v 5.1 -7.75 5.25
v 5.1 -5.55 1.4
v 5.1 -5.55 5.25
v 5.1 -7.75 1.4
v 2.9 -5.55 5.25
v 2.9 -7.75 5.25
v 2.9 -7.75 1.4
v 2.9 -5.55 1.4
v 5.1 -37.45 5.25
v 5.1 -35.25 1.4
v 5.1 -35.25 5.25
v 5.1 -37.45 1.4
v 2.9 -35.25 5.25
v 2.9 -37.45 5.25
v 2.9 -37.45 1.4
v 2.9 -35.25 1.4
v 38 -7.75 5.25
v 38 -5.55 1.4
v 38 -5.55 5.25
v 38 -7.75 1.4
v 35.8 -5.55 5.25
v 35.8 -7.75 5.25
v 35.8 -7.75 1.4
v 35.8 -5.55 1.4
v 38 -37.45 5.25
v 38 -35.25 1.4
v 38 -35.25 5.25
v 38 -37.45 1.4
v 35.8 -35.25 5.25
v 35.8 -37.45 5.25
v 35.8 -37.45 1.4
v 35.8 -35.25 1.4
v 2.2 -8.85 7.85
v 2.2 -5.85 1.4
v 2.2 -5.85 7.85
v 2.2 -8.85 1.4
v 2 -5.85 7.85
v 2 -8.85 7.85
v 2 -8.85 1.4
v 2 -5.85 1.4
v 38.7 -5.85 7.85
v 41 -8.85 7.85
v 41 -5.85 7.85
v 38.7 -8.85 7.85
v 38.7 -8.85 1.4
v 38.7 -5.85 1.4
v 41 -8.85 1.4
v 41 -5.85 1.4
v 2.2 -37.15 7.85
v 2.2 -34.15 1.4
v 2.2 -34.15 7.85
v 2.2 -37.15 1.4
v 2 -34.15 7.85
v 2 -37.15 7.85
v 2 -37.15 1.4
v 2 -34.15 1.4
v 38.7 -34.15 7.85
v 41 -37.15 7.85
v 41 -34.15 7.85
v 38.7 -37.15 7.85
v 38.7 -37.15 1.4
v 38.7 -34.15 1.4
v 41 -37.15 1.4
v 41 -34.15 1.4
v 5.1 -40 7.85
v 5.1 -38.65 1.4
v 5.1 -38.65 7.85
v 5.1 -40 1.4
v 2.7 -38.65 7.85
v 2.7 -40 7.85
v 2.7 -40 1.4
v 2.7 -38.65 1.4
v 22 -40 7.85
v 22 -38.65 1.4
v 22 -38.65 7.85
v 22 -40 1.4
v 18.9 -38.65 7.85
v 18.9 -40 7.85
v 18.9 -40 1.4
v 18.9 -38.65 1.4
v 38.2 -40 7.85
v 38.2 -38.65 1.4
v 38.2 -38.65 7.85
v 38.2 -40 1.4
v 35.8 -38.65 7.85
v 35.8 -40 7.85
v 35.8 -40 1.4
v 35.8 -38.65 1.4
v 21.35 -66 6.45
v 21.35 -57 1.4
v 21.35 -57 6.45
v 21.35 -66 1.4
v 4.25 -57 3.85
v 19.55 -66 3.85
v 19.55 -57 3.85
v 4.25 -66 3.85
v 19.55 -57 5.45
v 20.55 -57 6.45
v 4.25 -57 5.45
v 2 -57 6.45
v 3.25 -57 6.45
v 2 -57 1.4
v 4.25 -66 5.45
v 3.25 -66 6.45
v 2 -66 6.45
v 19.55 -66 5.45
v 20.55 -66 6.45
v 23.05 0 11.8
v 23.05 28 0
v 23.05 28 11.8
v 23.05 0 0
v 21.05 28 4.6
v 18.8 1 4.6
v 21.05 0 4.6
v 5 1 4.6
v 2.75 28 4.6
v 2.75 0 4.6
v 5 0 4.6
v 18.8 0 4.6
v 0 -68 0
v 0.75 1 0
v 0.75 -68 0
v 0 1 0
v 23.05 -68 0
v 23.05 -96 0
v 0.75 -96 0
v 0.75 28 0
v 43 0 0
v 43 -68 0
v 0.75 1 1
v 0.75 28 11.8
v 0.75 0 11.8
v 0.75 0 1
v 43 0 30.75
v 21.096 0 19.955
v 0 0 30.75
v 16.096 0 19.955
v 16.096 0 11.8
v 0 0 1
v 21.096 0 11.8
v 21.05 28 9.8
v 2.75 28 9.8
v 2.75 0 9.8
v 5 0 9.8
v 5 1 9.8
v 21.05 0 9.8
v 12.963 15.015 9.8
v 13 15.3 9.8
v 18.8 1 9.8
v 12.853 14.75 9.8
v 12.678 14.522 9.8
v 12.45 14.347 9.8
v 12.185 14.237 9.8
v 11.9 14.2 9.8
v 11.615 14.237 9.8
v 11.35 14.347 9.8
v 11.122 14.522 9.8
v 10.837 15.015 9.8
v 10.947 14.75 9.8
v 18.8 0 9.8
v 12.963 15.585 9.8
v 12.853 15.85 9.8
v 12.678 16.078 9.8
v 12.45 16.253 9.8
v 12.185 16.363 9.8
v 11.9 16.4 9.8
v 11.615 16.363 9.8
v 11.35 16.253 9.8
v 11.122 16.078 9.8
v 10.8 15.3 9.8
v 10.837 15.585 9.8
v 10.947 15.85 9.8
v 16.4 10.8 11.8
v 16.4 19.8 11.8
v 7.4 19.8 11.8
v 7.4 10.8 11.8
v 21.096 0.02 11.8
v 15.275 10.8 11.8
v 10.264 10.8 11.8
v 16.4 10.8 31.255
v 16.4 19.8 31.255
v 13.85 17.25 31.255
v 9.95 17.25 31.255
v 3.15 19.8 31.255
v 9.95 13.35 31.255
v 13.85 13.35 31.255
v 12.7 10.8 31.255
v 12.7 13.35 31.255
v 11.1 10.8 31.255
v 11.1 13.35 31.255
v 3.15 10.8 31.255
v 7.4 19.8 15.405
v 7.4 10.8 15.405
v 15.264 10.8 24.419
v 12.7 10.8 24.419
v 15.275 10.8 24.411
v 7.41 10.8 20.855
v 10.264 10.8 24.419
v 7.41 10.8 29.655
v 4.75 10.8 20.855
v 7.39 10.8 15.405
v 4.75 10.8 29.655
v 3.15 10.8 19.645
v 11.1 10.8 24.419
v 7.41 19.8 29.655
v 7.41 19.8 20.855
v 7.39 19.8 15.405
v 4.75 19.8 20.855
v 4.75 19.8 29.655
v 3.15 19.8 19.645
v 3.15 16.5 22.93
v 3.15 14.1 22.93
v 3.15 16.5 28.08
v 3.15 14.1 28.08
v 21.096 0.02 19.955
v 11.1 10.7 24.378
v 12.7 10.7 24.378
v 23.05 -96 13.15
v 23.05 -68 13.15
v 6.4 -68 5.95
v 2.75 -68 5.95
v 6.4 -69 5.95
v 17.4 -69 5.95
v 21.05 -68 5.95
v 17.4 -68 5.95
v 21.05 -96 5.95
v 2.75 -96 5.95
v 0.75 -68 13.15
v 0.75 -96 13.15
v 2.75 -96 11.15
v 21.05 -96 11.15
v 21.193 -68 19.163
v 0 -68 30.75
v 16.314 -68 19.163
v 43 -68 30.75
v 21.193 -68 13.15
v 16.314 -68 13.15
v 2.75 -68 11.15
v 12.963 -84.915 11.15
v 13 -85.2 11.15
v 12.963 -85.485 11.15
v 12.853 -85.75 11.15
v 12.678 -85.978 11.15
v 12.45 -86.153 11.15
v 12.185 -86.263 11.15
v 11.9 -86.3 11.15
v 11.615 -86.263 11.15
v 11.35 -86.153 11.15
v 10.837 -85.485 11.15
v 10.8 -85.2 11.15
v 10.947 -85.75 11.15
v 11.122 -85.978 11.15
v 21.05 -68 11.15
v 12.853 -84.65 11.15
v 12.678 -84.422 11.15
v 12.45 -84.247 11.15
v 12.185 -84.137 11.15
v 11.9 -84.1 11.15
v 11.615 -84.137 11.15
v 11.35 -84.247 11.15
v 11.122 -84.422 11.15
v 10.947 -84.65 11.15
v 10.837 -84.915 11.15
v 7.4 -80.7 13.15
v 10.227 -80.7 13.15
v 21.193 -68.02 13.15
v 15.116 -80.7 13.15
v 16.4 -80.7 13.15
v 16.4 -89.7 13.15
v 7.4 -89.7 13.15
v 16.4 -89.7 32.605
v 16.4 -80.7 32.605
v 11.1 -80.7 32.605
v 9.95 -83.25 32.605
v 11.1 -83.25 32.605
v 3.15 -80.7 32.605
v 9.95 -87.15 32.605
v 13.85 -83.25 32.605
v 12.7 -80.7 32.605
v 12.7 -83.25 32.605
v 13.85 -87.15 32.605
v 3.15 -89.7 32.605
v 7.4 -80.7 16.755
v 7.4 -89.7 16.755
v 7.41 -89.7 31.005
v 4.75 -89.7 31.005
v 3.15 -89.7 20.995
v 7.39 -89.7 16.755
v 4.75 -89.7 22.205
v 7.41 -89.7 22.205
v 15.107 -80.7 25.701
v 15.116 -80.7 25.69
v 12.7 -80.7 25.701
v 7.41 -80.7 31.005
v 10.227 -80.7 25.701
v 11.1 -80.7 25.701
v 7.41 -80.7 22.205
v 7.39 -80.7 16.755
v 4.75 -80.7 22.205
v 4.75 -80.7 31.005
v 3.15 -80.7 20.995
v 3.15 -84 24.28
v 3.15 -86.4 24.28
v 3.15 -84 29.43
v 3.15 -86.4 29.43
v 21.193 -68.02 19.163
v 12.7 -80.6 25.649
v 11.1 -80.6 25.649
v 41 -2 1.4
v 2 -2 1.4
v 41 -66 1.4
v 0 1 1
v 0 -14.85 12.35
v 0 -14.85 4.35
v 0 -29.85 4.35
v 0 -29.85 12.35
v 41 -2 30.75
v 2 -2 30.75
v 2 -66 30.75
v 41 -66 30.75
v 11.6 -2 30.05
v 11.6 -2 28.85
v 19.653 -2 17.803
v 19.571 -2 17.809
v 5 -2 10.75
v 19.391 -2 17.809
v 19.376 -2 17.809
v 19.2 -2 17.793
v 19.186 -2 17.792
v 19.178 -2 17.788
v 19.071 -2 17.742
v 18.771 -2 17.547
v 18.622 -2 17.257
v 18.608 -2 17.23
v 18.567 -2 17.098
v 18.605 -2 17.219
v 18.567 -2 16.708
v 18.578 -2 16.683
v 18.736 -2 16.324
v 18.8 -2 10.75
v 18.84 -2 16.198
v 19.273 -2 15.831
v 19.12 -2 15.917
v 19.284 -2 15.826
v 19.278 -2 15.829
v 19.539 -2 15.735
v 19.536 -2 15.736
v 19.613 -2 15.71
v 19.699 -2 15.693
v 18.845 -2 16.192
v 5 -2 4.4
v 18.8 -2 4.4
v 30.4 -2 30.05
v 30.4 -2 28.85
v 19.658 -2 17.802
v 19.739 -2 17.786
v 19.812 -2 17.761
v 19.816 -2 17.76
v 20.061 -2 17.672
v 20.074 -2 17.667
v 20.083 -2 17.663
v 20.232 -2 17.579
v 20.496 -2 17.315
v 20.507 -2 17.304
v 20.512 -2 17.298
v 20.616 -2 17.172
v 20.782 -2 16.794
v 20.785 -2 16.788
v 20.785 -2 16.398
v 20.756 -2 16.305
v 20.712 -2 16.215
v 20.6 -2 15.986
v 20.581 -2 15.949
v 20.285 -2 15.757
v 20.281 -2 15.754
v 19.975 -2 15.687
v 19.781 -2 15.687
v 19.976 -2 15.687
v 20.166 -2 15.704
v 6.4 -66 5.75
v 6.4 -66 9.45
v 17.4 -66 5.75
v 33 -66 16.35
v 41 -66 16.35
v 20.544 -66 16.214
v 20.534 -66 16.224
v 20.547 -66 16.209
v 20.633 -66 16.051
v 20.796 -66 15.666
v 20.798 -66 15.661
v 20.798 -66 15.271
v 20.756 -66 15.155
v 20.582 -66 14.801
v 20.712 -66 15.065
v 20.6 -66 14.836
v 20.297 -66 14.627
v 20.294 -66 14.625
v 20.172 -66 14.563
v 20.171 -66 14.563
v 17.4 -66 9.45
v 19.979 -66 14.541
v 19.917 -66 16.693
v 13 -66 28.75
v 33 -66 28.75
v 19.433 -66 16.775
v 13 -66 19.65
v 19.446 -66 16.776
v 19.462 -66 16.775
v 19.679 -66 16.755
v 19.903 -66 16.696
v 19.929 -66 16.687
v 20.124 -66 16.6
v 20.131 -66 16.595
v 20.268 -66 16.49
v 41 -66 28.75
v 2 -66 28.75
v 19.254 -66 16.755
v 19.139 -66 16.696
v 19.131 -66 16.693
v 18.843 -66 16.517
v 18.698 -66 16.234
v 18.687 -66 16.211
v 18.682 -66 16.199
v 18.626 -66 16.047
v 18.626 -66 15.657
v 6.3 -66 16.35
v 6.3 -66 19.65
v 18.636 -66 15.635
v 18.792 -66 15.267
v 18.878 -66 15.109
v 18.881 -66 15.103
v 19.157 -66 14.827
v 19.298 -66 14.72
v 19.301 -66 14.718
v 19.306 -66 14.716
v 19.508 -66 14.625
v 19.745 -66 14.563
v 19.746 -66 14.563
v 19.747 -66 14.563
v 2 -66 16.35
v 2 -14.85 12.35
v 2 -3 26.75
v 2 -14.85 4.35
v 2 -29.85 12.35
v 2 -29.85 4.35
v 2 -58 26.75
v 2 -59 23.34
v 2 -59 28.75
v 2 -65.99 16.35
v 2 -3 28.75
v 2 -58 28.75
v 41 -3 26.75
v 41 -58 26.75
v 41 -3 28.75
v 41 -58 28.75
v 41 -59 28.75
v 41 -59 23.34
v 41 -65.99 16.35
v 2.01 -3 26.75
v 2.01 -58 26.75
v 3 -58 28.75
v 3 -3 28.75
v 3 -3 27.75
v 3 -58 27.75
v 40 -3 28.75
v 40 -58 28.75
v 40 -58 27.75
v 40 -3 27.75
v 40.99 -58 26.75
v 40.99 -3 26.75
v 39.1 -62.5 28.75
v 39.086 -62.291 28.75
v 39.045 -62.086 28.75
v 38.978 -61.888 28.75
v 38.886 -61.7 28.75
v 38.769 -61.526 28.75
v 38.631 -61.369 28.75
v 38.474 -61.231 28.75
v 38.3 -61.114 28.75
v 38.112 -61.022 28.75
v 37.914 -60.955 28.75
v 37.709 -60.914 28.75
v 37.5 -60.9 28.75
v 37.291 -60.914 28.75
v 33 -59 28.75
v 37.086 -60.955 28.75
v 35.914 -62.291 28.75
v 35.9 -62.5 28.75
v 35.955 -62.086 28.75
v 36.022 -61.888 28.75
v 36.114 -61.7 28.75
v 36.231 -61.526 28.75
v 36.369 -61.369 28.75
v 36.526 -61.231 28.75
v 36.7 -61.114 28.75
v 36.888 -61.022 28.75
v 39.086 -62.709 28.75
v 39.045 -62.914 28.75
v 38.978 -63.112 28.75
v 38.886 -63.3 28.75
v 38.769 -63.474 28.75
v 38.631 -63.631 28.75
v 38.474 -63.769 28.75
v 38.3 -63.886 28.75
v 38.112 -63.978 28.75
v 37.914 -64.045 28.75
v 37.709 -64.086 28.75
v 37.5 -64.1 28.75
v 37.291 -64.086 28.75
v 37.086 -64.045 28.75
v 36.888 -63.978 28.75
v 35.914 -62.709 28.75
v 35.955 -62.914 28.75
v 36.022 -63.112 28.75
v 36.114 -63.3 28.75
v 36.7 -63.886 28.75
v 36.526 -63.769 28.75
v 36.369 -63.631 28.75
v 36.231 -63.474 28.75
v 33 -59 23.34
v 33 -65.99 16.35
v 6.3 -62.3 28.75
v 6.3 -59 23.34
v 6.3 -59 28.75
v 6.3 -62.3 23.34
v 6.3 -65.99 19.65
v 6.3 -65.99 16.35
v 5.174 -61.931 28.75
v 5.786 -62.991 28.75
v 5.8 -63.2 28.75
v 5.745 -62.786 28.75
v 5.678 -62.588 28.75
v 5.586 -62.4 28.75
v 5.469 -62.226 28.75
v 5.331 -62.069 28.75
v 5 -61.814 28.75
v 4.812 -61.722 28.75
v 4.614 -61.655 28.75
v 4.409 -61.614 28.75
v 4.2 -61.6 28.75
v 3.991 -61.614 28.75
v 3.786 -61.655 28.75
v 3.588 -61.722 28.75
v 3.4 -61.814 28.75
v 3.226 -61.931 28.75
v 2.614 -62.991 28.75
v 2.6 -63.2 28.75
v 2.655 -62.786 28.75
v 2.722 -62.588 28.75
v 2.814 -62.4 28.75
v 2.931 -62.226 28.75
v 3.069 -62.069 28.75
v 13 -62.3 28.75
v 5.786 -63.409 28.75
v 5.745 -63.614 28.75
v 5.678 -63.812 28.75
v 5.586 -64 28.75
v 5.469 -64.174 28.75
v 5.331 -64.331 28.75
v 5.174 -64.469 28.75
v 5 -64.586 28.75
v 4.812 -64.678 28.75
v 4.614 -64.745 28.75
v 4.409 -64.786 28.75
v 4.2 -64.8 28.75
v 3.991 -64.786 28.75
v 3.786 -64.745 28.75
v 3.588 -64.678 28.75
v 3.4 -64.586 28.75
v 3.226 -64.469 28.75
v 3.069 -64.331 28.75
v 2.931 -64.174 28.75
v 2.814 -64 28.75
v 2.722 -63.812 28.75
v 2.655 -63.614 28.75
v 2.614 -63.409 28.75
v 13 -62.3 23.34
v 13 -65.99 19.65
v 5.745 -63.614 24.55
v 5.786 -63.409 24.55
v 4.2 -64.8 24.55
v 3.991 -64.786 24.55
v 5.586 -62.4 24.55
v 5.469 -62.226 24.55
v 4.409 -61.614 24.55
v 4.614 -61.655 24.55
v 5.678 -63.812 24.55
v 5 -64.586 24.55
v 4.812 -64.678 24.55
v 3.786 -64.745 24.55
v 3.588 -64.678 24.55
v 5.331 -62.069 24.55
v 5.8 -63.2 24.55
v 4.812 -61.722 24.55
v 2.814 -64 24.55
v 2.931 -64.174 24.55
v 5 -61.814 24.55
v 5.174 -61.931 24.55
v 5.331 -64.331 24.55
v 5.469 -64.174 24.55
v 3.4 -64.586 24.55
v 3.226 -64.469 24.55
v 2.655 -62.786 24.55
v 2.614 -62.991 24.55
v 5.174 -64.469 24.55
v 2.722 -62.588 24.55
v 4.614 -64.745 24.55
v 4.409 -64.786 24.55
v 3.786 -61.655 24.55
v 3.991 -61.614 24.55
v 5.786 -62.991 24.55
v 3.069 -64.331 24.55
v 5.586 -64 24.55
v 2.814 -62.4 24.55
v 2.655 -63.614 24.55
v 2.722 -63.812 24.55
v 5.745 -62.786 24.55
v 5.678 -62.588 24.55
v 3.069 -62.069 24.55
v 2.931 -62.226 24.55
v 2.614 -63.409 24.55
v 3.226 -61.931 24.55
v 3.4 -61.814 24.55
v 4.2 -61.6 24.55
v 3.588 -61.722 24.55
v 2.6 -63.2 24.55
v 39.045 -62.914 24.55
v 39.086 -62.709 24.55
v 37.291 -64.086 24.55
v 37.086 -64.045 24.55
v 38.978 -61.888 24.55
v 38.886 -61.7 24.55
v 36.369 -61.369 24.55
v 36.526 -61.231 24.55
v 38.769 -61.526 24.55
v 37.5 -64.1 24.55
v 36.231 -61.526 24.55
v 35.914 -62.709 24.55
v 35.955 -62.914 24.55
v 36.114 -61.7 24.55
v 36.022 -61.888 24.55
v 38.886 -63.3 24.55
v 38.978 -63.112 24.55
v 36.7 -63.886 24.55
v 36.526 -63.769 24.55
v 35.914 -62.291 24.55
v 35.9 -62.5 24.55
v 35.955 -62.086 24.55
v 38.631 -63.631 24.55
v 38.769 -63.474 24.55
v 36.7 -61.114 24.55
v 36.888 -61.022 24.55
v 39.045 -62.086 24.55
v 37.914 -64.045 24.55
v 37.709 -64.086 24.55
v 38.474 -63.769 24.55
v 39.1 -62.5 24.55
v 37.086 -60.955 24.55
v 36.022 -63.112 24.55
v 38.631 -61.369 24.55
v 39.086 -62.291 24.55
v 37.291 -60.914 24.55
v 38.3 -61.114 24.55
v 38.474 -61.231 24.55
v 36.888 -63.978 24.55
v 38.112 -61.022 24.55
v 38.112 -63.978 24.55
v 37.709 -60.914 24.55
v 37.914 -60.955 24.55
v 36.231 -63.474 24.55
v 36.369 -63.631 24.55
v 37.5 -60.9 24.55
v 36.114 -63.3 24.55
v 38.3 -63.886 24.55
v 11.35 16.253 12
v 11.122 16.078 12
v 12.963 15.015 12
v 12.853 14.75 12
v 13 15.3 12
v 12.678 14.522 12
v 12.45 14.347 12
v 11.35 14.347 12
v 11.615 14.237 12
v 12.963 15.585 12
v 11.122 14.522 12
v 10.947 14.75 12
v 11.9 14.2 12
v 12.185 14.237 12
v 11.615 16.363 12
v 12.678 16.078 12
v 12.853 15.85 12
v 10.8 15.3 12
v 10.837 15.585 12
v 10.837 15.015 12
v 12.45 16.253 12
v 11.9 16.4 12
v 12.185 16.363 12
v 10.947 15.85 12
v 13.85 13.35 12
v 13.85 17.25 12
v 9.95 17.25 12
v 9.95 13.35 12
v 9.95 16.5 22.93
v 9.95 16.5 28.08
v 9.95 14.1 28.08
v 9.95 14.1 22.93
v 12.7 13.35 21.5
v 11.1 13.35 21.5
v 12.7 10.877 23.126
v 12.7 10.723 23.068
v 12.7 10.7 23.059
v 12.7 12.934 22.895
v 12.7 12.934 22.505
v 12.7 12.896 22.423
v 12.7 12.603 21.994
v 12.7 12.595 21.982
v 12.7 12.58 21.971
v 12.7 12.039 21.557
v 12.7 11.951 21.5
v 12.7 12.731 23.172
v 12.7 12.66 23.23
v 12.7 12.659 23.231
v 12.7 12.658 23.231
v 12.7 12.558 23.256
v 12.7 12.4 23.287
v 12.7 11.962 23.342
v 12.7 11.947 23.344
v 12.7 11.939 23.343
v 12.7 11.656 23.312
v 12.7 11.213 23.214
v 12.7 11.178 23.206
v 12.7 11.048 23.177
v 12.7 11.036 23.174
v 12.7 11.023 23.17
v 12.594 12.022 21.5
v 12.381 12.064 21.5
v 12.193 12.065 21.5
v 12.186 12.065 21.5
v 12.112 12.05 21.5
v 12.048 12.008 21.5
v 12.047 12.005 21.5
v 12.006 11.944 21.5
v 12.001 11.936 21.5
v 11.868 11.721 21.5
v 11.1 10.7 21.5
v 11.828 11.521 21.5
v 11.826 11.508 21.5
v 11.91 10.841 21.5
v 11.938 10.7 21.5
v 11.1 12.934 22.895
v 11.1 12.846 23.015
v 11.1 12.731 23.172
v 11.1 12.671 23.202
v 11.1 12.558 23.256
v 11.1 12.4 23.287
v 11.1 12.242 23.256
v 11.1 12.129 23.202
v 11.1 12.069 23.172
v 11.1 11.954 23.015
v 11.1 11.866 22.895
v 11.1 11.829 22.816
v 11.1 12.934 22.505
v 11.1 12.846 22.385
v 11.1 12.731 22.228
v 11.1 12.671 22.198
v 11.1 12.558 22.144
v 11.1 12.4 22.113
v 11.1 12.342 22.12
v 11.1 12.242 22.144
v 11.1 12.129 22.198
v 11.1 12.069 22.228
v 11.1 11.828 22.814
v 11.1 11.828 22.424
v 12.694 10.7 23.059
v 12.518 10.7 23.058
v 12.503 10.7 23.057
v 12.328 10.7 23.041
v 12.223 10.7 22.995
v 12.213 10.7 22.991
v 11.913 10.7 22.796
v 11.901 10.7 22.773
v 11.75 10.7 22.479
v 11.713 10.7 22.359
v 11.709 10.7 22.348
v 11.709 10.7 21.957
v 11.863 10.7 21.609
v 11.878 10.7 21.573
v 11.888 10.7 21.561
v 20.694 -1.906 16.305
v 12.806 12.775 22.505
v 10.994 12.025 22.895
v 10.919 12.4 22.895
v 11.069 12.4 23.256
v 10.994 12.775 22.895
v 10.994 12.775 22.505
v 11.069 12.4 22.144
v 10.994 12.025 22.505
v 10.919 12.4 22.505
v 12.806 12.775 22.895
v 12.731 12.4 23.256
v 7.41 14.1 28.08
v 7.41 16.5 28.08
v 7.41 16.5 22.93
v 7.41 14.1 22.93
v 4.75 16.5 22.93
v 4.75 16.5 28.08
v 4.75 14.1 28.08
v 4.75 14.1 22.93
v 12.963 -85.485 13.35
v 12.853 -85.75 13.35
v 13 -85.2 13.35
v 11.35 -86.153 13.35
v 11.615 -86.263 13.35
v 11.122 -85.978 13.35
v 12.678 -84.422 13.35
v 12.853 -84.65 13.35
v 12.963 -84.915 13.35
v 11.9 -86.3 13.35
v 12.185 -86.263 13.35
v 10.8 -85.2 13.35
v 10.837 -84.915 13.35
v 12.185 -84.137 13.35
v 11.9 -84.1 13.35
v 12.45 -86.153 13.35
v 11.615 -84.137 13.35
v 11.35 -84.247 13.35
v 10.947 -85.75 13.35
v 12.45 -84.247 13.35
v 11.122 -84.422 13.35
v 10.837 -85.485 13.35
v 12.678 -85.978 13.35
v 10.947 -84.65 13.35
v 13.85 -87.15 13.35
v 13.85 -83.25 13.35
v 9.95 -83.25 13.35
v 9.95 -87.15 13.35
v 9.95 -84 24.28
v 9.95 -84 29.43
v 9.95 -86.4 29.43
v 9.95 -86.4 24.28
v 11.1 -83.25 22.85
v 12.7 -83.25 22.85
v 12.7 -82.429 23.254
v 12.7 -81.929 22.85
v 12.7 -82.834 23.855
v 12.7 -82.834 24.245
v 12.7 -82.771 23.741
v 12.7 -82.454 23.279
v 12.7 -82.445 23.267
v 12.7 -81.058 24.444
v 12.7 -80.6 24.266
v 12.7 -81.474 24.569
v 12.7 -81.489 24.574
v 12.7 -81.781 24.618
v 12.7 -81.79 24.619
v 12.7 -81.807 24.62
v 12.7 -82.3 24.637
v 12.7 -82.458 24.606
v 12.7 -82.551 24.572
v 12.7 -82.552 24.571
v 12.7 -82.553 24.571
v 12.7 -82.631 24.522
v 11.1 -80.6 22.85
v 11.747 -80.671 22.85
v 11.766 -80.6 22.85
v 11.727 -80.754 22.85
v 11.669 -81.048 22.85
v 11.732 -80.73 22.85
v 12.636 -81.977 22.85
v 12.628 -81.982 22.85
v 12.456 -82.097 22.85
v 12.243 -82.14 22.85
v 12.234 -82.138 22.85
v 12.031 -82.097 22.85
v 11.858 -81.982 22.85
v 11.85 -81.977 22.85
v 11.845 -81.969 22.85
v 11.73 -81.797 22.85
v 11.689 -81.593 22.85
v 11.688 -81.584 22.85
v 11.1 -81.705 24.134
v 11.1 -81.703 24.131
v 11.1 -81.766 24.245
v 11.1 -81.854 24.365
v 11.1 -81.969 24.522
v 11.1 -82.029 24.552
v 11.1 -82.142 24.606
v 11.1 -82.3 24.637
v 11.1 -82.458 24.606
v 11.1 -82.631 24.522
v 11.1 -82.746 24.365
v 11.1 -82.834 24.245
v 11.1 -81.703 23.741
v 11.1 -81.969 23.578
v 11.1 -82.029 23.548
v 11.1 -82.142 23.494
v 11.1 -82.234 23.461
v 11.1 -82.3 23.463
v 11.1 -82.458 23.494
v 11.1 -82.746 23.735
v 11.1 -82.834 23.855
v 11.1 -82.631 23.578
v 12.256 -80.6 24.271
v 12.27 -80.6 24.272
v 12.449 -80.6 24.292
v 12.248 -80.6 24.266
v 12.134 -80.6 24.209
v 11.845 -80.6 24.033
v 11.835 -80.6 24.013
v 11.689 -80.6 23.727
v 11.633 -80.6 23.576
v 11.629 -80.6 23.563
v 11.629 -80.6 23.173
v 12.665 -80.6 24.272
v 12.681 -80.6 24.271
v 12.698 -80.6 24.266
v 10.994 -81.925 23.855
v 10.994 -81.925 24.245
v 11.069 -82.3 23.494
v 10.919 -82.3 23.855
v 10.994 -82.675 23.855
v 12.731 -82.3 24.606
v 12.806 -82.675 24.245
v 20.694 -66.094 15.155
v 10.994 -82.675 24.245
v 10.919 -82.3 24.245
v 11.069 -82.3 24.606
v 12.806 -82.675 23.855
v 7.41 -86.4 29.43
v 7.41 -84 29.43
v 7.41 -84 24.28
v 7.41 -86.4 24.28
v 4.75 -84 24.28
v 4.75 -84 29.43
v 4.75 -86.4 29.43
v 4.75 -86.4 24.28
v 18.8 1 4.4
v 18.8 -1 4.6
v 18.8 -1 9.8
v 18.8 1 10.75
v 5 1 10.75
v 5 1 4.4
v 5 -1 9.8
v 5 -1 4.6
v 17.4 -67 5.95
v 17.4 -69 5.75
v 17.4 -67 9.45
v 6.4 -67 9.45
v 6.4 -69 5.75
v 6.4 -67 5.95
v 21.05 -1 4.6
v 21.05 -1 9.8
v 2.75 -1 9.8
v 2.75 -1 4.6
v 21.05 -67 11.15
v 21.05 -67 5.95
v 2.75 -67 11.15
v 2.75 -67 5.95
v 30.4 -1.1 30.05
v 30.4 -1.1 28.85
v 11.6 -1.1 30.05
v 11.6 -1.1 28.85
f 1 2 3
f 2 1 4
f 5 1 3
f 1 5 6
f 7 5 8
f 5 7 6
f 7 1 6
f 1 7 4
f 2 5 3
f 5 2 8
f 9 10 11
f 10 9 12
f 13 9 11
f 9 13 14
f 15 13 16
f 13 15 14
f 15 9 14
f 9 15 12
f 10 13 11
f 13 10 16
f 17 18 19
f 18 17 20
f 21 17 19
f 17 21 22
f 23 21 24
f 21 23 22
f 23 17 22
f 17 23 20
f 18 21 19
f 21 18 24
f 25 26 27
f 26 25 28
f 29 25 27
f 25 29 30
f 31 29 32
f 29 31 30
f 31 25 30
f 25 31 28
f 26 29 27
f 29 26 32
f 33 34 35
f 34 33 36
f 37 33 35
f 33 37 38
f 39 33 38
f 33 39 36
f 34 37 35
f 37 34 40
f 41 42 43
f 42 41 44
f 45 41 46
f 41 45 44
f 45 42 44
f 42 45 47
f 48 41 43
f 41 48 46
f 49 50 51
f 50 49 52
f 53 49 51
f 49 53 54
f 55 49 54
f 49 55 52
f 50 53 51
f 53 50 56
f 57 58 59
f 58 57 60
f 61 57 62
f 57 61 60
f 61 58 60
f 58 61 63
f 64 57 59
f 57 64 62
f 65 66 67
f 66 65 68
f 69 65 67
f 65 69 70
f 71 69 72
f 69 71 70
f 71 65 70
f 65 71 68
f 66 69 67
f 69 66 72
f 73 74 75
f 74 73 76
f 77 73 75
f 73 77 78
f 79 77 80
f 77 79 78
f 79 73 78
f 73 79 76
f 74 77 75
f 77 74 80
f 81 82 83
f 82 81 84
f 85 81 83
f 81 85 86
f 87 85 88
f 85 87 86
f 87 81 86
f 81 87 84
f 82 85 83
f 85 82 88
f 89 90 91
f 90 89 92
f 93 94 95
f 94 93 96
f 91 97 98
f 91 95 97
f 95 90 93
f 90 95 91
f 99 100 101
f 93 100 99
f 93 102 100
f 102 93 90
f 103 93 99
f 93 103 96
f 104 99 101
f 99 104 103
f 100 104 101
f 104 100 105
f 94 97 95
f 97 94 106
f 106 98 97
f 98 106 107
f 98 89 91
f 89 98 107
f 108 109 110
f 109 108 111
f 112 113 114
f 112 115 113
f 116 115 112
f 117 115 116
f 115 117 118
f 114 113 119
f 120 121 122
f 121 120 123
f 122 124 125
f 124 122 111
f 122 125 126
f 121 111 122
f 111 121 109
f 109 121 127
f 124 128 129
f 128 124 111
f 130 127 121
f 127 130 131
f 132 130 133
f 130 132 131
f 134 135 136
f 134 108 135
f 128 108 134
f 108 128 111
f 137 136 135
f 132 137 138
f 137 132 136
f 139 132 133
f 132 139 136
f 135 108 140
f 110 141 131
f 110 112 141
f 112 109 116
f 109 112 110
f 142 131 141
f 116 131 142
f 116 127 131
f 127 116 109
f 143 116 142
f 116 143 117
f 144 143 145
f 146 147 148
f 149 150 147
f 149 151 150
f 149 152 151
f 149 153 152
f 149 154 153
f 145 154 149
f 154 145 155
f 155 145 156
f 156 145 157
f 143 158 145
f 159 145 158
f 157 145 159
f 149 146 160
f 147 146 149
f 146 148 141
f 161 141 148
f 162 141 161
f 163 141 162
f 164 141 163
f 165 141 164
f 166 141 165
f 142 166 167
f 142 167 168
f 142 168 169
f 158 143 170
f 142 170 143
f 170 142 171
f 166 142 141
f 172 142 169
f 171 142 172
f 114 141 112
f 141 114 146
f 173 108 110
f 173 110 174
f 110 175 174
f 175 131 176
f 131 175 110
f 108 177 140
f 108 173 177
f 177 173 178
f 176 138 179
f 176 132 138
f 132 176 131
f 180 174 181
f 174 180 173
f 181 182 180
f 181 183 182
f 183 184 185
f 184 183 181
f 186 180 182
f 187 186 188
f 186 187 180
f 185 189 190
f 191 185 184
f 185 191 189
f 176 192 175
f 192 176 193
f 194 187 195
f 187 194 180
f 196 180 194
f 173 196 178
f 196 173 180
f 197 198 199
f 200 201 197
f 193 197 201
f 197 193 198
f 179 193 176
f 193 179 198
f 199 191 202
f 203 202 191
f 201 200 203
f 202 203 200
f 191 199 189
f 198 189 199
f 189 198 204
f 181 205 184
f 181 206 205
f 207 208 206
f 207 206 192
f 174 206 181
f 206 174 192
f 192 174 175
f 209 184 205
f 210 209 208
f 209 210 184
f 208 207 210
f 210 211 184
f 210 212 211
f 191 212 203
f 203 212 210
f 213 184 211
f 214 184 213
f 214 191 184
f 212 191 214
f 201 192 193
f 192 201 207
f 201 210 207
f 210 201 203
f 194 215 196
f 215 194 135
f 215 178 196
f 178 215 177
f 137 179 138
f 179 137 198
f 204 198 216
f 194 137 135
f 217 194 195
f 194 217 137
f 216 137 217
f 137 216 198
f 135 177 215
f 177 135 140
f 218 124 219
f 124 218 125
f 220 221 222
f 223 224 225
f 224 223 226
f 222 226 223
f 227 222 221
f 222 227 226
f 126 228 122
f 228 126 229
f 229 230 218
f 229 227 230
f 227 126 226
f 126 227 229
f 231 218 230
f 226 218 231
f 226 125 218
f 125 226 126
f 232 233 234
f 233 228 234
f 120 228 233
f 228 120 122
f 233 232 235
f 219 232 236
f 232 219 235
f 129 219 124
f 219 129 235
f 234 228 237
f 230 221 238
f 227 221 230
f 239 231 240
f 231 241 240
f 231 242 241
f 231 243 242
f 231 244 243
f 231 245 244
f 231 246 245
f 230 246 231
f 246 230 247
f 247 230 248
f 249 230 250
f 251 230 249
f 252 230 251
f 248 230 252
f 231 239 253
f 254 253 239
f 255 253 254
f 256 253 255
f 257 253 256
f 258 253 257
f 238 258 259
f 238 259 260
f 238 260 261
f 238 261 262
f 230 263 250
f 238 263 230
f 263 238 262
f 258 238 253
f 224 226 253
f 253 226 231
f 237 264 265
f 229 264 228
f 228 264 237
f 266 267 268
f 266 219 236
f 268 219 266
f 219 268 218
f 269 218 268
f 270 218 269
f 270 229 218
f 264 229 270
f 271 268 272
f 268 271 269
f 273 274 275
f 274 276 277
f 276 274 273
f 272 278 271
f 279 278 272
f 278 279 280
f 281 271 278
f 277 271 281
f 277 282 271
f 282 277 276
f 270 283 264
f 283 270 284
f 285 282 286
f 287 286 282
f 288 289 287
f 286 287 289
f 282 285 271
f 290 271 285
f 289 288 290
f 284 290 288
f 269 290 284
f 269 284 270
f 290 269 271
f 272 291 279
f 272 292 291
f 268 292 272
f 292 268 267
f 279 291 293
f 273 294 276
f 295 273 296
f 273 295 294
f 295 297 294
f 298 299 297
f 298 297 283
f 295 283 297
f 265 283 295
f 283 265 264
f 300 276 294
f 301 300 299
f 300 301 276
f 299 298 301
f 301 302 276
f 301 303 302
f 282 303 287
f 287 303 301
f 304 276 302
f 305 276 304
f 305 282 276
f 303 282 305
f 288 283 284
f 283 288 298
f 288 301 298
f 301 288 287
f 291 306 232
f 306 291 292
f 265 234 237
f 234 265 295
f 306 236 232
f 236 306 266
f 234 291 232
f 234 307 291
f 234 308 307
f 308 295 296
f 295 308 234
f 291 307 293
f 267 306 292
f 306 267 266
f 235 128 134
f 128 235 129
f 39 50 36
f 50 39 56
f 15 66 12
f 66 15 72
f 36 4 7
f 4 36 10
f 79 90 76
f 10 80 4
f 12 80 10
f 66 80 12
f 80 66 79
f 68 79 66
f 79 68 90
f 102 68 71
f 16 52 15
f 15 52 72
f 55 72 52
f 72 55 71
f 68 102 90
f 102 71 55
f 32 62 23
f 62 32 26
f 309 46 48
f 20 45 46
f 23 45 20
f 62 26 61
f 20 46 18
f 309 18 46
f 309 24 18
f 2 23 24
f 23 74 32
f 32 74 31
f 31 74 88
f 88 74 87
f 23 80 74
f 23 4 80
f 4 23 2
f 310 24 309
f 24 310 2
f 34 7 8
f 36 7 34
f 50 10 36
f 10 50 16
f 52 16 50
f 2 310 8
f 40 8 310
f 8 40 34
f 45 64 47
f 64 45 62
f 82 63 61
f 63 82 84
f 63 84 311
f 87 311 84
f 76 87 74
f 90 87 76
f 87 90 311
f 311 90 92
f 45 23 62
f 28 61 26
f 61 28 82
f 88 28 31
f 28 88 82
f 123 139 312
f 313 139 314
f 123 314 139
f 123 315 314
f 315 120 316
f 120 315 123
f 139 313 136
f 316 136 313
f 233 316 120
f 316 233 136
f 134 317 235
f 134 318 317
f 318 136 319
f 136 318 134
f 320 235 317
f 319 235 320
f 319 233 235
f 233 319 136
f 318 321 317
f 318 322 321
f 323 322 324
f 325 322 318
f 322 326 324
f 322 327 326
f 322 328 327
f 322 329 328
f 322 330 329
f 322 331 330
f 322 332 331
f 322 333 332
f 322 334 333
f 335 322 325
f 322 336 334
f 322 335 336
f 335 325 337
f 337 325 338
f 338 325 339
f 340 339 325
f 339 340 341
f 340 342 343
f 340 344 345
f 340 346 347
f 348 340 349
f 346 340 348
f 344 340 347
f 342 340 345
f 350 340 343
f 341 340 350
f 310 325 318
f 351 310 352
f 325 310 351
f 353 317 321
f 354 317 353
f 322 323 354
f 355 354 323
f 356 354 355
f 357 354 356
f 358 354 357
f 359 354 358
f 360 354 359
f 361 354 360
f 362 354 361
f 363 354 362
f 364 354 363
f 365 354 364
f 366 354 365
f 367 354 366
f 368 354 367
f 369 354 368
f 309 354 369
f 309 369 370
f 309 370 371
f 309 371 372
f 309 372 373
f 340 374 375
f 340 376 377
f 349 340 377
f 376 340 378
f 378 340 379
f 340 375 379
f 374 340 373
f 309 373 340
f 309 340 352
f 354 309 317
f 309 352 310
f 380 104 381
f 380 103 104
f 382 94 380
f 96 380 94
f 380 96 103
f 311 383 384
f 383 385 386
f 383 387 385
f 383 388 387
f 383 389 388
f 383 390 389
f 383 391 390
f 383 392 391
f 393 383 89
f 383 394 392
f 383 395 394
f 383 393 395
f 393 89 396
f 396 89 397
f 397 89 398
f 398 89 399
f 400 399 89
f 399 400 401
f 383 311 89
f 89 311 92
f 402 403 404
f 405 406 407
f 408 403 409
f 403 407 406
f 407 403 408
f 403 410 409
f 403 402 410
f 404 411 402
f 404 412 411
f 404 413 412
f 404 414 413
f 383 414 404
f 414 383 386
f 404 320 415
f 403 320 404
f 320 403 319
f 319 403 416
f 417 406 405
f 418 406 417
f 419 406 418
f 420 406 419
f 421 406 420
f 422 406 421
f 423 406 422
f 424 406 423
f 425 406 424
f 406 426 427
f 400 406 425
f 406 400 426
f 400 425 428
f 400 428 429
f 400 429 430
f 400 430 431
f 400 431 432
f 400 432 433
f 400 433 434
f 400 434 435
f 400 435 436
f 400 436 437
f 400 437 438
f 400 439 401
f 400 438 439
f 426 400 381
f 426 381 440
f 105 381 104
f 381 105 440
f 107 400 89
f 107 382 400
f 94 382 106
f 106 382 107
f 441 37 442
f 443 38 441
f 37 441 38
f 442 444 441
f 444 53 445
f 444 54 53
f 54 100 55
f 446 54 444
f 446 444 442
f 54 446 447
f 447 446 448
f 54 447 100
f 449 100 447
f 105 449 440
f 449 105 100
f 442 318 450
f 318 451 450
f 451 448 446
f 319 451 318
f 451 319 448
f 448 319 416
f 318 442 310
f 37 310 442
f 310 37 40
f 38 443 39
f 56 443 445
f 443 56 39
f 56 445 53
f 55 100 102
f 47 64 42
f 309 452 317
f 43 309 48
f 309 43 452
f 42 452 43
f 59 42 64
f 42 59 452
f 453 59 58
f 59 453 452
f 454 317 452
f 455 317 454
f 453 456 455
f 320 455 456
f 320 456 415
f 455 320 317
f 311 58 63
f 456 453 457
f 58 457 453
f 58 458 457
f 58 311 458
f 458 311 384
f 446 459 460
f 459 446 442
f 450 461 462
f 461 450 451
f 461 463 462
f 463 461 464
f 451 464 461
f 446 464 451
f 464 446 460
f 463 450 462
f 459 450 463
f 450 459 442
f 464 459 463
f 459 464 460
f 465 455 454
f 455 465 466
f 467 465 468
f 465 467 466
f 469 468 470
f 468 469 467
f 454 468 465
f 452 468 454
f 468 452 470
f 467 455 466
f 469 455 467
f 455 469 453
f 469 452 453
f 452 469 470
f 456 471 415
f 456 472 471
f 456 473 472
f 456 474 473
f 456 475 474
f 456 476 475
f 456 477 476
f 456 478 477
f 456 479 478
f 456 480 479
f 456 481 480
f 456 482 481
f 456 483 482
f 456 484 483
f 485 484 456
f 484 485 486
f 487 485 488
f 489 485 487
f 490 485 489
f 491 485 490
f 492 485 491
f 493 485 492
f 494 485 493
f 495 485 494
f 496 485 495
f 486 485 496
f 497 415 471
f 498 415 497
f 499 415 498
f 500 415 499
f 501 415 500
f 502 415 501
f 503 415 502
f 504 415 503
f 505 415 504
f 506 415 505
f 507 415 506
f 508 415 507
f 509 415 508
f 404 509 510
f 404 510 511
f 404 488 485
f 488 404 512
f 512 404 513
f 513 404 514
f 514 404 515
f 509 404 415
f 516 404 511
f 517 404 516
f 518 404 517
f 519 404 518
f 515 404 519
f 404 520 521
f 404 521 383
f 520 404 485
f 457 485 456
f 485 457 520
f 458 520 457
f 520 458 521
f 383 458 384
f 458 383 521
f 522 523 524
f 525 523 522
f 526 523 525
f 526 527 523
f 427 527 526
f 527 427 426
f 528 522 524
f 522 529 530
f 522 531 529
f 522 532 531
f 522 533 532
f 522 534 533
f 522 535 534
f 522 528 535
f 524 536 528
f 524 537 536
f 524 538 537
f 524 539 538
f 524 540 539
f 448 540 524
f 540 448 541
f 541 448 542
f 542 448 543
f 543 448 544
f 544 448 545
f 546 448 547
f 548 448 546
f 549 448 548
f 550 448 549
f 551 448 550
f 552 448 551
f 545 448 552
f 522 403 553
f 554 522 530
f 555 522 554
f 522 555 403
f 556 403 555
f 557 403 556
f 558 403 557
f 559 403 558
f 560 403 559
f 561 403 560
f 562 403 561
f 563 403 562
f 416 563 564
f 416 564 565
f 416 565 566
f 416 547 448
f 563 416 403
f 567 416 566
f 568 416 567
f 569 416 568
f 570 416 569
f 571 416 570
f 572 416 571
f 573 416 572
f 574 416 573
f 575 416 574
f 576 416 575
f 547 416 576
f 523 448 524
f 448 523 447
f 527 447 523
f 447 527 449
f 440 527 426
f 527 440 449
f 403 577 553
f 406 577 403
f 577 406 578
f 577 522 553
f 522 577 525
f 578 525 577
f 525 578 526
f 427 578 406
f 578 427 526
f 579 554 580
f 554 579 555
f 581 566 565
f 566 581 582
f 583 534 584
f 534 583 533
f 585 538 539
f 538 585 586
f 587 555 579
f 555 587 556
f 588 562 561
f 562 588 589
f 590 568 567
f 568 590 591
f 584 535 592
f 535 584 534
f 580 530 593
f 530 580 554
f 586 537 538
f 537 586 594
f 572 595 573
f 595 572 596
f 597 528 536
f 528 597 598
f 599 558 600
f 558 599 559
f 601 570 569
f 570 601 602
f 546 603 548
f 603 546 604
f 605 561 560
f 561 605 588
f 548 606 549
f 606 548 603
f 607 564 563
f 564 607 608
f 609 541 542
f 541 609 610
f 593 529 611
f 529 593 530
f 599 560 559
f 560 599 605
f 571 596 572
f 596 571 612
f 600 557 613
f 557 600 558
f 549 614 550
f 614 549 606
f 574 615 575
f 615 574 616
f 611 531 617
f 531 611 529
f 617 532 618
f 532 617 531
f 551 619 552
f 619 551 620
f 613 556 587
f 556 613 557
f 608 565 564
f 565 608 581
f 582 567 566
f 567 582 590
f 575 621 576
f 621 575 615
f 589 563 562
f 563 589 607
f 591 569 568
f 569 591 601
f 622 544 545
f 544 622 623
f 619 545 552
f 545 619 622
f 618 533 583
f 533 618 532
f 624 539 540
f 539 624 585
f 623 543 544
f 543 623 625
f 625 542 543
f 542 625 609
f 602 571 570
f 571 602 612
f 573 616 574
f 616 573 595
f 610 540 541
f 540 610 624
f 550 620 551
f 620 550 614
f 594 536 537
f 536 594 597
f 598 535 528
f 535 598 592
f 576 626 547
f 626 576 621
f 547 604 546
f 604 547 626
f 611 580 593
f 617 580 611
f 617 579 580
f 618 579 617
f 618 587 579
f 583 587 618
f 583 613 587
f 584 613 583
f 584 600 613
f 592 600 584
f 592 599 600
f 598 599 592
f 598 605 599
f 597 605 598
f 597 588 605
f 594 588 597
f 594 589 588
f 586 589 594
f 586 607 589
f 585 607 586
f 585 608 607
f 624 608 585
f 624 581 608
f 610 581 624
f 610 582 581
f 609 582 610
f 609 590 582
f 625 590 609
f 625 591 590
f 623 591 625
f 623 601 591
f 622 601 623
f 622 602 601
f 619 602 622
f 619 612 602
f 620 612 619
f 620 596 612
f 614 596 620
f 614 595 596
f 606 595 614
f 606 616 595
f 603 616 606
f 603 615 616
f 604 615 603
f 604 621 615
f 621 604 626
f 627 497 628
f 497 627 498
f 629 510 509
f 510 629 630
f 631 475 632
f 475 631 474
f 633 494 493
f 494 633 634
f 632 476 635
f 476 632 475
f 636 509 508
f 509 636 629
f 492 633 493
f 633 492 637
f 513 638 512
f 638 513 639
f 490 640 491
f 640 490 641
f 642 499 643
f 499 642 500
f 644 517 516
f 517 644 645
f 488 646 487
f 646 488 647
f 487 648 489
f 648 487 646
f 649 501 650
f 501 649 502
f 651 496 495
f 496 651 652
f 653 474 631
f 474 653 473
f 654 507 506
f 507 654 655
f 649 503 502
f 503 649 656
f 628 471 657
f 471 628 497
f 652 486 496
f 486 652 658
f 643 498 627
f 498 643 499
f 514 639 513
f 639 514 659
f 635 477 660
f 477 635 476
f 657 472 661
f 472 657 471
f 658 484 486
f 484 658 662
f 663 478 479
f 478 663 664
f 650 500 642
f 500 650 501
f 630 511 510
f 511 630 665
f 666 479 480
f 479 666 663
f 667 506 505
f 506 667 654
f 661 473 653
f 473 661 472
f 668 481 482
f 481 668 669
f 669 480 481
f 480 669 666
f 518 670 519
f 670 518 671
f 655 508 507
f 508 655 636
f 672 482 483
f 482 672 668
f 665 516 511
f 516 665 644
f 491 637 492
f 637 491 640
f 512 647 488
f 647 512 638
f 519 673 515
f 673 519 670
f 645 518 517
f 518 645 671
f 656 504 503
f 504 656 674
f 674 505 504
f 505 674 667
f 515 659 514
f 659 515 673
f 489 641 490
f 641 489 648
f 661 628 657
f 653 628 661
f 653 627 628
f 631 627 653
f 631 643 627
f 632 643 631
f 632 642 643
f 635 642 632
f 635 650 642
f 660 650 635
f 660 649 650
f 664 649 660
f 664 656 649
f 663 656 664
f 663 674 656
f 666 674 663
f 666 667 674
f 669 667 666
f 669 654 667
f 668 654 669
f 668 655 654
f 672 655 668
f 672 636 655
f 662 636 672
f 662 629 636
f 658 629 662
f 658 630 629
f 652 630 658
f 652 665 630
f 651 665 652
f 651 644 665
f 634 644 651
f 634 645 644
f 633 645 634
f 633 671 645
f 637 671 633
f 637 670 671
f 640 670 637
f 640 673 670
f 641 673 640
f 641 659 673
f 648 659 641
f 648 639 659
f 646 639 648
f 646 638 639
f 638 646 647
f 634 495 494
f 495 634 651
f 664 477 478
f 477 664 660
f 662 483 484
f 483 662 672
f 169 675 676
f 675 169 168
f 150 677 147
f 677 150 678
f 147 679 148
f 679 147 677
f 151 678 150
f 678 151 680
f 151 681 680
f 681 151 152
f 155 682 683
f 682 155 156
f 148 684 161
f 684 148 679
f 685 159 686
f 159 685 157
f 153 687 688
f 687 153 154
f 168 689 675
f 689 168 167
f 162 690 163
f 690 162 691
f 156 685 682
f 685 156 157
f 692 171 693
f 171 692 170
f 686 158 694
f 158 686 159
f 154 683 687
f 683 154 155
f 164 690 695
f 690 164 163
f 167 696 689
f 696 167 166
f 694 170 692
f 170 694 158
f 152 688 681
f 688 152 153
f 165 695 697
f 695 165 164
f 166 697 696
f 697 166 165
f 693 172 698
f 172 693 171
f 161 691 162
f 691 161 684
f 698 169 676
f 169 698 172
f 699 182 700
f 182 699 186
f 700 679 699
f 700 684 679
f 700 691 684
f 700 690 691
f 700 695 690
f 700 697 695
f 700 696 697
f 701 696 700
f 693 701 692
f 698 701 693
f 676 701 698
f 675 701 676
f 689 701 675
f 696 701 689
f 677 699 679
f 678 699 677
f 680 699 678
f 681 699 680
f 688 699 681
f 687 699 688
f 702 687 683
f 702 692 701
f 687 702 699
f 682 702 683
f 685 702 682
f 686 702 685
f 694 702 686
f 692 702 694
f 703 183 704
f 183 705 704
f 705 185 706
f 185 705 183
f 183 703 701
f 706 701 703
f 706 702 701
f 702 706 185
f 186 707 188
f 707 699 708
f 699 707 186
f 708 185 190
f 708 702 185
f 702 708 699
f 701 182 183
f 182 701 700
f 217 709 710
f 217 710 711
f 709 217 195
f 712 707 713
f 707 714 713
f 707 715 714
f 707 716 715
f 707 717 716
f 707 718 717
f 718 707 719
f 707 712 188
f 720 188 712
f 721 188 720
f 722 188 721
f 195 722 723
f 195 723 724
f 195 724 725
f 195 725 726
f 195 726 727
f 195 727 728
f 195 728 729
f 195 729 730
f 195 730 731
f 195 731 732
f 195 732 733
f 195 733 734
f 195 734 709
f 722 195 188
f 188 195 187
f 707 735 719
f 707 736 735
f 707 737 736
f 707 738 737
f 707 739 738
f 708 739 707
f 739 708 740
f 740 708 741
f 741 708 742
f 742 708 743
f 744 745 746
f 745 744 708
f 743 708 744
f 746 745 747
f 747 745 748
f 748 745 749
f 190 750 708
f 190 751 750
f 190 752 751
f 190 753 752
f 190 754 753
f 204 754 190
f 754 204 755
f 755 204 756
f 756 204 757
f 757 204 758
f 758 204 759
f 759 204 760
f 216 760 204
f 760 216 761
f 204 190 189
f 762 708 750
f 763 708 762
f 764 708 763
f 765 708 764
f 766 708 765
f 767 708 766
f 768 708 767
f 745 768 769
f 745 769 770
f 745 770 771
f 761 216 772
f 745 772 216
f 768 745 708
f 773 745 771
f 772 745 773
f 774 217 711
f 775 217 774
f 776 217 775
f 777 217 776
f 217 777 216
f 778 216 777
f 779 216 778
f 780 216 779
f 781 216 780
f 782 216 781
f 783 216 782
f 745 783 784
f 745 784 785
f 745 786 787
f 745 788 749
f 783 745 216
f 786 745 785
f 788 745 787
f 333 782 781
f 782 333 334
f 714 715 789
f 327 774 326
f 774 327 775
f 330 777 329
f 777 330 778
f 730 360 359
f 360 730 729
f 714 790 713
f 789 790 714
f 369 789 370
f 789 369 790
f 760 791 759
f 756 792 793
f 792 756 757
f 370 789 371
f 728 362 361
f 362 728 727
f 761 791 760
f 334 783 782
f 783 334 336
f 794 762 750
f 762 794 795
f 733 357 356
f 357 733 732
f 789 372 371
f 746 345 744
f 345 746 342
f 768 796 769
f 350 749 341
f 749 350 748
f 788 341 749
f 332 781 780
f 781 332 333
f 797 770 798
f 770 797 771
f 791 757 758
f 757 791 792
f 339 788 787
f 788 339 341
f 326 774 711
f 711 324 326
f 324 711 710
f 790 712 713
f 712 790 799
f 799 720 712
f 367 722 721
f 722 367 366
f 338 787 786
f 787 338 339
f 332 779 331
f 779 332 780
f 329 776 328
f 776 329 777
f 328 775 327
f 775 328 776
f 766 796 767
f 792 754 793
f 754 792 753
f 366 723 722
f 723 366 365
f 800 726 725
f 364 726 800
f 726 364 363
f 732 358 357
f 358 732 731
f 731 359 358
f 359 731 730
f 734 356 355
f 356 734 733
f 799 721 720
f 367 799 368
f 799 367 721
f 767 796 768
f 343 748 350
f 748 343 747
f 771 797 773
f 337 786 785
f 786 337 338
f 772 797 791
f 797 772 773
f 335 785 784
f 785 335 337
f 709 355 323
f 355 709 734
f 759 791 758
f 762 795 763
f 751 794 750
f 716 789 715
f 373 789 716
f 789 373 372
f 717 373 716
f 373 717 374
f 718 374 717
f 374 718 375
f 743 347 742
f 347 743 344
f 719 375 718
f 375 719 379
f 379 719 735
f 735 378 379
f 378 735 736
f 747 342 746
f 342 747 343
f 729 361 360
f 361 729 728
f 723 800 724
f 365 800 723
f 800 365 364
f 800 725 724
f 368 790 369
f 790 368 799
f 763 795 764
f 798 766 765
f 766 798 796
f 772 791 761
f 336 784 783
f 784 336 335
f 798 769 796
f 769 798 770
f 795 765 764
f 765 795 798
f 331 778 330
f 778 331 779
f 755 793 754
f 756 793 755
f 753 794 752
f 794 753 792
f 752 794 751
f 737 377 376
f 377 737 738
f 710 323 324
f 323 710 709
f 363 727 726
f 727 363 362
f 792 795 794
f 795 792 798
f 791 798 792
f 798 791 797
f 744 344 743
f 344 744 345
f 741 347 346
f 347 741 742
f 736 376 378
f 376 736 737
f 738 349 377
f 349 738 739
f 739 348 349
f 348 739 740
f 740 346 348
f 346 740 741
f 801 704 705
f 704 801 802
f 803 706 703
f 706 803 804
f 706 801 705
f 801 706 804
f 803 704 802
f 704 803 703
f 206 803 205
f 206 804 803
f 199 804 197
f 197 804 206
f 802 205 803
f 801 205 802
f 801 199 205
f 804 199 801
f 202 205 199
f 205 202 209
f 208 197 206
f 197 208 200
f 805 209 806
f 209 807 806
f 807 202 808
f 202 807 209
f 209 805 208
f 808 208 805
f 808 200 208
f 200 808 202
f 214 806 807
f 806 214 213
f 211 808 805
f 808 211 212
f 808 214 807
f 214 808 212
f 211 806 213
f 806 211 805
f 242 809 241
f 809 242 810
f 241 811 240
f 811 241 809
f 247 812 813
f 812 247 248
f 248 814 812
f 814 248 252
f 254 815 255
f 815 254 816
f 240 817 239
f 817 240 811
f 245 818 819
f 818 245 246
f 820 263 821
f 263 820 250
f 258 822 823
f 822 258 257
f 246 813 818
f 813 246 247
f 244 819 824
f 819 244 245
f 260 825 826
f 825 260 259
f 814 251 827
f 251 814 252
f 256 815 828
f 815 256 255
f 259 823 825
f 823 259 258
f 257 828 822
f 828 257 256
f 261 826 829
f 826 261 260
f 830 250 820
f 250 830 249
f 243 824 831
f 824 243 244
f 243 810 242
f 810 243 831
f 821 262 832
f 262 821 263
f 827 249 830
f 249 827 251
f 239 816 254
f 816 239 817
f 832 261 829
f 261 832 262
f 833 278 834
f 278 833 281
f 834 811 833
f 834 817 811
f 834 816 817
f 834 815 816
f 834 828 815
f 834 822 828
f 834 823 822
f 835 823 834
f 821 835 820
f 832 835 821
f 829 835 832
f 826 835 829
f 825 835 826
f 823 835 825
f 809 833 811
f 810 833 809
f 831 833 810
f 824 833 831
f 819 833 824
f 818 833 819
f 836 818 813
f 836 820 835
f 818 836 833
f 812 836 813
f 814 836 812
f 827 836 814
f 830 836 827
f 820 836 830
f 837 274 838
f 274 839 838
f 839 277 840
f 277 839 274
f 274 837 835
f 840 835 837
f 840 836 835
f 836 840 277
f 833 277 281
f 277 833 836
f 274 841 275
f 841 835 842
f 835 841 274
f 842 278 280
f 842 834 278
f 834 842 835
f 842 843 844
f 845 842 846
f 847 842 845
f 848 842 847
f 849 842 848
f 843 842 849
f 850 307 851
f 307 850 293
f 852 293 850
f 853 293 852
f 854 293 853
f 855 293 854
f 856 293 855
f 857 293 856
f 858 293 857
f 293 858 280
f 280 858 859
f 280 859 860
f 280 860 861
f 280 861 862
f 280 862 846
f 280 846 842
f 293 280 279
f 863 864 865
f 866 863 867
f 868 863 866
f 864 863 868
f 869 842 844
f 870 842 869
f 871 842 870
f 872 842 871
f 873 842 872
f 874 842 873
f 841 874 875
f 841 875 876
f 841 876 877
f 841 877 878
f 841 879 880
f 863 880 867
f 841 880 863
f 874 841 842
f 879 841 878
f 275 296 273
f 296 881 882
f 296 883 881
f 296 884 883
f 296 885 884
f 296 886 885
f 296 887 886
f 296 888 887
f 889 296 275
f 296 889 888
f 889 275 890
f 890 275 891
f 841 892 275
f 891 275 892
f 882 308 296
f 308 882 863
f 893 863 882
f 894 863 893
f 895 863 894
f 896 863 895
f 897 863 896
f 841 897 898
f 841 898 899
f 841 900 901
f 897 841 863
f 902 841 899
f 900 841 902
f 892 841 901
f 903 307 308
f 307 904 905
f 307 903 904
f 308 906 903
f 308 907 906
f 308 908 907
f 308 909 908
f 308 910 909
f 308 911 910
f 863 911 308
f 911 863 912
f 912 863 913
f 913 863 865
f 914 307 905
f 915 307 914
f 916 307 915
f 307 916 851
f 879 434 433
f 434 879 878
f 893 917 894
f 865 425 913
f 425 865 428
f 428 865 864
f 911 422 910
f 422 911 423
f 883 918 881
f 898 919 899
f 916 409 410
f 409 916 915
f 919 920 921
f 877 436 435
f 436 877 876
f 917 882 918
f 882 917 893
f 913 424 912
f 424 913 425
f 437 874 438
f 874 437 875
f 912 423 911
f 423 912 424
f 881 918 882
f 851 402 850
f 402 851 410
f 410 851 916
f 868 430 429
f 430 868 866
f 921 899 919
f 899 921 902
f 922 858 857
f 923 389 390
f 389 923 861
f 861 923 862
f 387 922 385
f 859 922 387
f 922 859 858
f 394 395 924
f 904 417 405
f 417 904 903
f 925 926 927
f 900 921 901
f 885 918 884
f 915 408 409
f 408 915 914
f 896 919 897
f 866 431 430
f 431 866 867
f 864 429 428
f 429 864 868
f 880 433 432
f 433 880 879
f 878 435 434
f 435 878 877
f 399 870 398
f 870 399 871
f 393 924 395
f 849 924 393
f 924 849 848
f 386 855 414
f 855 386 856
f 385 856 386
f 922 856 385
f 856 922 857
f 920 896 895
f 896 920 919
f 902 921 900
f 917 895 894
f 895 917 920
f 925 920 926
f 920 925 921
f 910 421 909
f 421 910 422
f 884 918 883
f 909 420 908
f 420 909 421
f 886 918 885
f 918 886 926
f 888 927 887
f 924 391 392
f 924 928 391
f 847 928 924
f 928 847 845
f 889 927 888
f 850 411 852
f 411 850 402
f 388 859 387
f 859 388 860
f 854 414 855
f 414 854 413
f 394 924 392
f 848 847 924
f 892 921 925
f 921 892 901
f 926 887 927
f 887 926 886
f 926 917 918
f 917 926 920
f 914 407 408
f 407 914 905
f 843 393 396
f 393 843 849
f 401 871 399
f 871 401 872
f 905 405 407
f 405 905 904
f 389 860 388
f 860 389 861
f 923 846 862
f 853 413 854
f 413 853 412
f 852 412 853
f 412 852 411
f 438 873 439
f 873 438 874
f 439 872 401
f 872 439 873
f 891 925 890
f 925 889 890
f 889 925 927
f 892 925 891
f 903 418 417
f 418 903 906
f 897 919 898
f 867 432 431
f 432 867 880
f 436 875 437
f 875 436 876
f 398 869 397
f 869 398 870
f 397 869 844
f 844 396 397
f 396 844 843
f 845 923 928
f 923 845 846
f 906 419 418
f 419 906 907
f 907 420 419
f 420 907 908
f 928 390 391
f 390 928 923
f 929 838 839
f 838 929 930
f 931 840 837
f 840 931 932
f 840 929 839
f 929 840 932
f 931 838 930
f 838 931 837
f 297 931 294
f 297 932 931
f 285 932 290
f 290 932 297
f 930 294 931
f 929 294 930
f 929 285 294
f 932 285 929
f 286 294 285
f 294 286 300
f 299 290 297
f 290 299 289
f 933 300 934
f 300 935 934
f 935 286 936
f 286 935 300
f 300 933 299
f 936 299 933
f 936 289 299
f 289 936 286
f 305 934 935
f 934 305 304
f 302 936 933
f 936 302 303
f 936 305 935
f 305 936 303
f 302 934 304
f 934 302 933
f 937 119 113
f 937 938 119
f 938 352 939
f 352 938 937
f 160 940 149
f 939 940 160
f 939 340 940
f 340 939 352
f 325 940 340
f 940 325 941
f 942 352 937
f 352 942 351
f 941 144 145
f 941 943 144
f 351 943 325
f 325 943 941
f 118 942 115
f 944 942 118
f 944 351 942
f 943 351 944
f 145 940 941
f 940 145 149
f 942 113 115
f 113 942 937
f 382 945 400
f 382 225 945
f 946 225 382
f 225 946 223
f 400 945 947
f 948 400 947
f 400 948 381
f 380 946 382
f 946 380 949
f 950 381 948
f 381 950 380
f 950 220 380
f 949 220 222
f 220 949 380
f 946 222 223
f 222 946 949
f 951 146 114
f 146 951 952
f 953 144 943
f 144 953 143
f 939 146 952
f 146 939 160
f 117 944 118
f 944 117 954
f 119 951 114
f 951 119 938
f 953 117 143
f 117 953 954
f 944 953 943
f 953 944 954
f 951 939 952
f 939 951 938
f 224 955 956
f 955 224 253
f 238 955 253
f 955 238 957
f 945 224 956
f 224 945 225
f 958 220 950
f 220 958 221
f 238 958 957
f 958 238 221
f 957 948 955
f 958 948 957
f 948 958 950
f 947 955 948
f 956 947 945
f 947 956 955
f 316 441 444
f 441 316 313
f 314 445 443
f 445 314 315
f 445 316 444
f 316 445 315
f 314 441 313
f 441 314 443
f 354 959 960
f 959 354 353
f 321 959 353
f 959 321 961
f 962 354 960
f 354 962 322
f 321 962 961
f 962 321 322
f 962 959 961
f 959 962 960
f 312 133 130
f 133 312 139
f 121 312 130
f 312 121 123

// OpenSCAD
// file: views.scad
// 2D views of the fixture for drawings/make.sh: a top view and a cut along the key centre line,
// each as a separate layer (body, lid and deck, bought parts, pin lift), plus the numbers they show.
// Render with -D 'part="none"' -D 'view="..."'.
include <../fixture.scad>

view = "echo";

// ---------------------------------------------------------------- bought parts (sizes from calipers)
module hub()     { bx(hub_x0, hub_x1, hub_t0, hub_t1, hub_top - hub_t, hub_top); }
module sockets() { for (xc = [pin_x, far_x]) { bx(xc - 6.5, xc + 6.5, n_face, n_face + 11, hub_top - 2.1, hub_top + 3.6);
                                            bx(xc - 6.5, xc + 6.5, s_face - 11, s_face, hub_top - 2.1, hub_top + 3.6); }
                   bx(hub_x0, hub_x0 + 7.5, usbc_t - 4.5, usbc_t + 4.5, hub_top, hub_top + 3.3); }
module yk5_adapter() { ab = plug_bot - yk5_ad_drop;
                   bx(pin_x - yk5_ad[0] / 2, pin_x + yk5_ad[0] / 2, s_face, yk5_face, ab, ab + yk5_ad[1]); }
module uturn()   { bx(far_x - 7, far_x + 7, s_face, s_face + 12.1, plug_bot - uturn_below, uturn_top); }
module rp2040()  { bx(hub_x1 - 17.5, hub_x1, s_face - 23.5, s_face, mcu_bot, mcu_bot + 1); }
module usb_in()  { bx(-12, hub_x0, usbc_t - 6, usbc_t + 6, hub_top + 1.6 - 3, hub_top + 1.6 + 3); }
module yk4()     { k = tunnel_z0; bx(pin_x - 8.9, pin_x + 8.9, n_face - 3.1 - 33, n_face - 3.1, k + 0.01, k + 3.3);
                   bx(pin_x - 6, pin_x + 6, n_face - 3.1, n_face + 8.8, k + yk4_plug_gap, k + yk4_plug_gap + 2.3); }
module yk5()     { k = tunnel_z0 + yk5_dz; bx(pin_x - 8.9, pin_x + 8.9, yk5_face + 4.8, yk5_face + 37.8, k + 0.01, k + 3.3);
                   bx(pin_x - 5, pin_x + 5, yk5_face + 0.01, yk5_face + 4.8, k + 0.3, k + 3.0); }
module boards()  { for (b = BOARDS) bx(b[0], b[0] + brd[0], b[1], b[1] + brd[1], deck_z1 - 0.6, deck_z1 - 0.6 + brd[2]); }
module bought()  { hub(); sockets(); yk5_adapter(); uturn(); rp2040(); usb_in(); boards(); }
module keys()    { yk4(); yk5(); }
module pogo(d)   { translate([0, 0, d[7]]) {                    // barrel, plunger pressed onto the button
                     cy(pin_x, d[2], barrel_top - 10.4, barrel_top, 1.02, 16);
                     cy(pin_x, d[2], pad_z, barrel_top - 10.4, 0.74, 16); } }
module lift()    { for (d = DRAWERS) { lift_in_place(d); pogo(d); } }

// a cut along the key centre line (x = pin_x), seen from the east: (ty, z)
module cut() { projection(cut = true) rotate([0, 0, 90]) rotate([0, 90, 0]) translate([-pin_x, 0, 0]) out() children(); }
// the top view: (x, ty); and a cut through it at z, to show the walls, fences, cradle and rails
module top() { projection() out() children(); }
module top_cut(z) { projection(cut = true) translate([0, 0, -z]) out() children(); }

// a side view (not a cut) for the parts beyond the cut, drawn dashed
module side() { projection() rotate([0, 0, 90]) rotate([0, 90, 0]) translate([-pin_x, 0, 0]) out() children(); }

if (view == "top_body")    top() body();
if (view == "top_floor")   top_cut(6) body();
if (view == "top_hub")     top() { hub(); sockets(); }
if (view == "top_adapter") top() yk5_adapter();
if (view == "top_uturn")   top() uturn();
if (view == "top_rp2040")  top() rp2040();
if (view == "top_usbin")   top() usb_in();
if (view == "top_keys")    top() keys();
if (view == "top_lift")    top() lift();
if (view == "cut_body")    cut() body();
if (view == "cut_cover")   cut() { deck(); lid(); }
if (view == "cut_hub")     cut() { hub(); sockets(); }
if (view == "cut_adapter") cut() yk5_adapter();
if (view == "cut_keys")    cut() keys();
if (view == "cut_lift")    cut() lift();
if (view == "side_uturn")  side() uturn();
if (view == "side_rp2040") side() rp2040();

if (view == "echo") {
    echo(str("DIM ", "box_w=", box_w, " box_l=", box_l, " box_h=", box_h, " wall=", wall, " slack=", slack, " fit=", fit,
             " hub_x0=", hub_x0, " hub_x1=", hub_x1, " hub_t0=", hub_t0, " hub_t1=", hub_t1, " hub_top=", hub_top,
             " n_face=", n_face, " s_face=", s_face, " yk5_face=", yk5_face, " a_face=", a_face,
             " pin_x=", pin_x, " pin_ty_yk4=", pin_ty_yk4, " pin_ty_yk5=", pin_ty_yk5,
             " yk4_btn=", yk4_btn, " yk5_btn=", yk5_btn, " btn_d=", btn_d, " sock_out=", sock_out,
             " hub_ns=", hub_ns, " hub_we=", hub_we, " adapter_out=", adapter_out,
             " deck_z0=", deck_z0, " deck_z1=", deck_z1, " lid_z=", lid_z, " mcu_bot=", mcu_bot, " mcu_z=", mcu_z,
             " uturn_top=", uturn_top, " uturn_h=", uturn_h, " tower_top=", tower_top, " yk5_dz=", yk5_dz,
             " ad_bot=", plug_bot - yk5_ad_drop, " pin_lift=", pin_lift, " drawer_n=", DRAWERS[0][0],
             " drawer_s=", DRAWERS[1][1]));
    cube(1);
}
// main file
// Parts for the assembly animation (drawings/animate.sh), each in its assembled place, one per render:
//   -D 'part="none"' -D 'item="..."'
// The pin lift parts (knob, filament, pogo pin, bar) are exported lifted, as they go in; the animation
// lowers them onto the buttons at the end.
include <views.scad>

item = "none";

module up_in_place(d, what) {   // one piece of the pin lift for drawer d, lifted (bar pushed north)
    pty = d[2]; s = d[5]; xf = pin_x - tower_w / 2;
    translate([0, 0, d[7]]) {
        if (what == "knob") translate([pin_x, pty, knob_z0 + pin_lift]) mirror([0, s > 0 ? 0 : 1, 0]) knob();
        if (what == "fil") translate([xf - bar_t, pty, fil_z + pin_lift]) rotate([0, 90, 0])
            cylinder(d = fil_d, h = pin_x + knob_w / 2 - xf + bar_t, $fn = 16);
        if (what == "bar") multmatrix([[0, 0, 1, xf - bar_t - 0.05], [1, 0, 0, pty - bar_u_up], [0, 1, 0, fil_z - bar_v_low], [0, 0, 0, 1]]) bar();
        if (what == "pogo") {
            cy(pin_x, pty, barrel_top + pin_lift - 10.4, barrel_top + pin_lift, 1.02, 16);
            cy(pin_x, pty, pad_z + pin_lift - pin_press, barrel_top + pin_lift - 10.4, 0.74, 16);
        }
    }
}
module disk(d) { k = tunnel_z0 + d[7]; cy(pin_x, d[2], k + 3.3, k + 3.4, btn_d, 48); }

out() {
    if (item == "body")    body();
    if (item == "deck")    deck();
    if (item == "lid")     lid();
    if (item == "hub")     hub();
    if (item == "sockets") sockets();
    if (item == "adapter") yk5_adapter();
    if (item == "uturn")   uturn();
    if (item == "usbin")   usb_in();
    if (item == "rp2040")  { rp2040(); bx(hub_x1 - 15.5, hub_x1 - 2, s_face - 20, s_face - 4, mcu_bot + 1, mcu_bot + 2.2); }
    if (item == "boards")  boards();
    if (item == "yk4")     yk4();
    if (item == "yk5")     yk5();
    if (item == "disk4")   disk(DRAWERS[0]);
    if (item == "disk5")   disk(DRAWERS[1]);
    for (i = [0 : 1]) for (w = ["knob", "fil", "bar", "pogo"])
        if (item == str(w, i == 0 ? "4" : "5")) up_in_place(DRAWERS[i], w);
}
